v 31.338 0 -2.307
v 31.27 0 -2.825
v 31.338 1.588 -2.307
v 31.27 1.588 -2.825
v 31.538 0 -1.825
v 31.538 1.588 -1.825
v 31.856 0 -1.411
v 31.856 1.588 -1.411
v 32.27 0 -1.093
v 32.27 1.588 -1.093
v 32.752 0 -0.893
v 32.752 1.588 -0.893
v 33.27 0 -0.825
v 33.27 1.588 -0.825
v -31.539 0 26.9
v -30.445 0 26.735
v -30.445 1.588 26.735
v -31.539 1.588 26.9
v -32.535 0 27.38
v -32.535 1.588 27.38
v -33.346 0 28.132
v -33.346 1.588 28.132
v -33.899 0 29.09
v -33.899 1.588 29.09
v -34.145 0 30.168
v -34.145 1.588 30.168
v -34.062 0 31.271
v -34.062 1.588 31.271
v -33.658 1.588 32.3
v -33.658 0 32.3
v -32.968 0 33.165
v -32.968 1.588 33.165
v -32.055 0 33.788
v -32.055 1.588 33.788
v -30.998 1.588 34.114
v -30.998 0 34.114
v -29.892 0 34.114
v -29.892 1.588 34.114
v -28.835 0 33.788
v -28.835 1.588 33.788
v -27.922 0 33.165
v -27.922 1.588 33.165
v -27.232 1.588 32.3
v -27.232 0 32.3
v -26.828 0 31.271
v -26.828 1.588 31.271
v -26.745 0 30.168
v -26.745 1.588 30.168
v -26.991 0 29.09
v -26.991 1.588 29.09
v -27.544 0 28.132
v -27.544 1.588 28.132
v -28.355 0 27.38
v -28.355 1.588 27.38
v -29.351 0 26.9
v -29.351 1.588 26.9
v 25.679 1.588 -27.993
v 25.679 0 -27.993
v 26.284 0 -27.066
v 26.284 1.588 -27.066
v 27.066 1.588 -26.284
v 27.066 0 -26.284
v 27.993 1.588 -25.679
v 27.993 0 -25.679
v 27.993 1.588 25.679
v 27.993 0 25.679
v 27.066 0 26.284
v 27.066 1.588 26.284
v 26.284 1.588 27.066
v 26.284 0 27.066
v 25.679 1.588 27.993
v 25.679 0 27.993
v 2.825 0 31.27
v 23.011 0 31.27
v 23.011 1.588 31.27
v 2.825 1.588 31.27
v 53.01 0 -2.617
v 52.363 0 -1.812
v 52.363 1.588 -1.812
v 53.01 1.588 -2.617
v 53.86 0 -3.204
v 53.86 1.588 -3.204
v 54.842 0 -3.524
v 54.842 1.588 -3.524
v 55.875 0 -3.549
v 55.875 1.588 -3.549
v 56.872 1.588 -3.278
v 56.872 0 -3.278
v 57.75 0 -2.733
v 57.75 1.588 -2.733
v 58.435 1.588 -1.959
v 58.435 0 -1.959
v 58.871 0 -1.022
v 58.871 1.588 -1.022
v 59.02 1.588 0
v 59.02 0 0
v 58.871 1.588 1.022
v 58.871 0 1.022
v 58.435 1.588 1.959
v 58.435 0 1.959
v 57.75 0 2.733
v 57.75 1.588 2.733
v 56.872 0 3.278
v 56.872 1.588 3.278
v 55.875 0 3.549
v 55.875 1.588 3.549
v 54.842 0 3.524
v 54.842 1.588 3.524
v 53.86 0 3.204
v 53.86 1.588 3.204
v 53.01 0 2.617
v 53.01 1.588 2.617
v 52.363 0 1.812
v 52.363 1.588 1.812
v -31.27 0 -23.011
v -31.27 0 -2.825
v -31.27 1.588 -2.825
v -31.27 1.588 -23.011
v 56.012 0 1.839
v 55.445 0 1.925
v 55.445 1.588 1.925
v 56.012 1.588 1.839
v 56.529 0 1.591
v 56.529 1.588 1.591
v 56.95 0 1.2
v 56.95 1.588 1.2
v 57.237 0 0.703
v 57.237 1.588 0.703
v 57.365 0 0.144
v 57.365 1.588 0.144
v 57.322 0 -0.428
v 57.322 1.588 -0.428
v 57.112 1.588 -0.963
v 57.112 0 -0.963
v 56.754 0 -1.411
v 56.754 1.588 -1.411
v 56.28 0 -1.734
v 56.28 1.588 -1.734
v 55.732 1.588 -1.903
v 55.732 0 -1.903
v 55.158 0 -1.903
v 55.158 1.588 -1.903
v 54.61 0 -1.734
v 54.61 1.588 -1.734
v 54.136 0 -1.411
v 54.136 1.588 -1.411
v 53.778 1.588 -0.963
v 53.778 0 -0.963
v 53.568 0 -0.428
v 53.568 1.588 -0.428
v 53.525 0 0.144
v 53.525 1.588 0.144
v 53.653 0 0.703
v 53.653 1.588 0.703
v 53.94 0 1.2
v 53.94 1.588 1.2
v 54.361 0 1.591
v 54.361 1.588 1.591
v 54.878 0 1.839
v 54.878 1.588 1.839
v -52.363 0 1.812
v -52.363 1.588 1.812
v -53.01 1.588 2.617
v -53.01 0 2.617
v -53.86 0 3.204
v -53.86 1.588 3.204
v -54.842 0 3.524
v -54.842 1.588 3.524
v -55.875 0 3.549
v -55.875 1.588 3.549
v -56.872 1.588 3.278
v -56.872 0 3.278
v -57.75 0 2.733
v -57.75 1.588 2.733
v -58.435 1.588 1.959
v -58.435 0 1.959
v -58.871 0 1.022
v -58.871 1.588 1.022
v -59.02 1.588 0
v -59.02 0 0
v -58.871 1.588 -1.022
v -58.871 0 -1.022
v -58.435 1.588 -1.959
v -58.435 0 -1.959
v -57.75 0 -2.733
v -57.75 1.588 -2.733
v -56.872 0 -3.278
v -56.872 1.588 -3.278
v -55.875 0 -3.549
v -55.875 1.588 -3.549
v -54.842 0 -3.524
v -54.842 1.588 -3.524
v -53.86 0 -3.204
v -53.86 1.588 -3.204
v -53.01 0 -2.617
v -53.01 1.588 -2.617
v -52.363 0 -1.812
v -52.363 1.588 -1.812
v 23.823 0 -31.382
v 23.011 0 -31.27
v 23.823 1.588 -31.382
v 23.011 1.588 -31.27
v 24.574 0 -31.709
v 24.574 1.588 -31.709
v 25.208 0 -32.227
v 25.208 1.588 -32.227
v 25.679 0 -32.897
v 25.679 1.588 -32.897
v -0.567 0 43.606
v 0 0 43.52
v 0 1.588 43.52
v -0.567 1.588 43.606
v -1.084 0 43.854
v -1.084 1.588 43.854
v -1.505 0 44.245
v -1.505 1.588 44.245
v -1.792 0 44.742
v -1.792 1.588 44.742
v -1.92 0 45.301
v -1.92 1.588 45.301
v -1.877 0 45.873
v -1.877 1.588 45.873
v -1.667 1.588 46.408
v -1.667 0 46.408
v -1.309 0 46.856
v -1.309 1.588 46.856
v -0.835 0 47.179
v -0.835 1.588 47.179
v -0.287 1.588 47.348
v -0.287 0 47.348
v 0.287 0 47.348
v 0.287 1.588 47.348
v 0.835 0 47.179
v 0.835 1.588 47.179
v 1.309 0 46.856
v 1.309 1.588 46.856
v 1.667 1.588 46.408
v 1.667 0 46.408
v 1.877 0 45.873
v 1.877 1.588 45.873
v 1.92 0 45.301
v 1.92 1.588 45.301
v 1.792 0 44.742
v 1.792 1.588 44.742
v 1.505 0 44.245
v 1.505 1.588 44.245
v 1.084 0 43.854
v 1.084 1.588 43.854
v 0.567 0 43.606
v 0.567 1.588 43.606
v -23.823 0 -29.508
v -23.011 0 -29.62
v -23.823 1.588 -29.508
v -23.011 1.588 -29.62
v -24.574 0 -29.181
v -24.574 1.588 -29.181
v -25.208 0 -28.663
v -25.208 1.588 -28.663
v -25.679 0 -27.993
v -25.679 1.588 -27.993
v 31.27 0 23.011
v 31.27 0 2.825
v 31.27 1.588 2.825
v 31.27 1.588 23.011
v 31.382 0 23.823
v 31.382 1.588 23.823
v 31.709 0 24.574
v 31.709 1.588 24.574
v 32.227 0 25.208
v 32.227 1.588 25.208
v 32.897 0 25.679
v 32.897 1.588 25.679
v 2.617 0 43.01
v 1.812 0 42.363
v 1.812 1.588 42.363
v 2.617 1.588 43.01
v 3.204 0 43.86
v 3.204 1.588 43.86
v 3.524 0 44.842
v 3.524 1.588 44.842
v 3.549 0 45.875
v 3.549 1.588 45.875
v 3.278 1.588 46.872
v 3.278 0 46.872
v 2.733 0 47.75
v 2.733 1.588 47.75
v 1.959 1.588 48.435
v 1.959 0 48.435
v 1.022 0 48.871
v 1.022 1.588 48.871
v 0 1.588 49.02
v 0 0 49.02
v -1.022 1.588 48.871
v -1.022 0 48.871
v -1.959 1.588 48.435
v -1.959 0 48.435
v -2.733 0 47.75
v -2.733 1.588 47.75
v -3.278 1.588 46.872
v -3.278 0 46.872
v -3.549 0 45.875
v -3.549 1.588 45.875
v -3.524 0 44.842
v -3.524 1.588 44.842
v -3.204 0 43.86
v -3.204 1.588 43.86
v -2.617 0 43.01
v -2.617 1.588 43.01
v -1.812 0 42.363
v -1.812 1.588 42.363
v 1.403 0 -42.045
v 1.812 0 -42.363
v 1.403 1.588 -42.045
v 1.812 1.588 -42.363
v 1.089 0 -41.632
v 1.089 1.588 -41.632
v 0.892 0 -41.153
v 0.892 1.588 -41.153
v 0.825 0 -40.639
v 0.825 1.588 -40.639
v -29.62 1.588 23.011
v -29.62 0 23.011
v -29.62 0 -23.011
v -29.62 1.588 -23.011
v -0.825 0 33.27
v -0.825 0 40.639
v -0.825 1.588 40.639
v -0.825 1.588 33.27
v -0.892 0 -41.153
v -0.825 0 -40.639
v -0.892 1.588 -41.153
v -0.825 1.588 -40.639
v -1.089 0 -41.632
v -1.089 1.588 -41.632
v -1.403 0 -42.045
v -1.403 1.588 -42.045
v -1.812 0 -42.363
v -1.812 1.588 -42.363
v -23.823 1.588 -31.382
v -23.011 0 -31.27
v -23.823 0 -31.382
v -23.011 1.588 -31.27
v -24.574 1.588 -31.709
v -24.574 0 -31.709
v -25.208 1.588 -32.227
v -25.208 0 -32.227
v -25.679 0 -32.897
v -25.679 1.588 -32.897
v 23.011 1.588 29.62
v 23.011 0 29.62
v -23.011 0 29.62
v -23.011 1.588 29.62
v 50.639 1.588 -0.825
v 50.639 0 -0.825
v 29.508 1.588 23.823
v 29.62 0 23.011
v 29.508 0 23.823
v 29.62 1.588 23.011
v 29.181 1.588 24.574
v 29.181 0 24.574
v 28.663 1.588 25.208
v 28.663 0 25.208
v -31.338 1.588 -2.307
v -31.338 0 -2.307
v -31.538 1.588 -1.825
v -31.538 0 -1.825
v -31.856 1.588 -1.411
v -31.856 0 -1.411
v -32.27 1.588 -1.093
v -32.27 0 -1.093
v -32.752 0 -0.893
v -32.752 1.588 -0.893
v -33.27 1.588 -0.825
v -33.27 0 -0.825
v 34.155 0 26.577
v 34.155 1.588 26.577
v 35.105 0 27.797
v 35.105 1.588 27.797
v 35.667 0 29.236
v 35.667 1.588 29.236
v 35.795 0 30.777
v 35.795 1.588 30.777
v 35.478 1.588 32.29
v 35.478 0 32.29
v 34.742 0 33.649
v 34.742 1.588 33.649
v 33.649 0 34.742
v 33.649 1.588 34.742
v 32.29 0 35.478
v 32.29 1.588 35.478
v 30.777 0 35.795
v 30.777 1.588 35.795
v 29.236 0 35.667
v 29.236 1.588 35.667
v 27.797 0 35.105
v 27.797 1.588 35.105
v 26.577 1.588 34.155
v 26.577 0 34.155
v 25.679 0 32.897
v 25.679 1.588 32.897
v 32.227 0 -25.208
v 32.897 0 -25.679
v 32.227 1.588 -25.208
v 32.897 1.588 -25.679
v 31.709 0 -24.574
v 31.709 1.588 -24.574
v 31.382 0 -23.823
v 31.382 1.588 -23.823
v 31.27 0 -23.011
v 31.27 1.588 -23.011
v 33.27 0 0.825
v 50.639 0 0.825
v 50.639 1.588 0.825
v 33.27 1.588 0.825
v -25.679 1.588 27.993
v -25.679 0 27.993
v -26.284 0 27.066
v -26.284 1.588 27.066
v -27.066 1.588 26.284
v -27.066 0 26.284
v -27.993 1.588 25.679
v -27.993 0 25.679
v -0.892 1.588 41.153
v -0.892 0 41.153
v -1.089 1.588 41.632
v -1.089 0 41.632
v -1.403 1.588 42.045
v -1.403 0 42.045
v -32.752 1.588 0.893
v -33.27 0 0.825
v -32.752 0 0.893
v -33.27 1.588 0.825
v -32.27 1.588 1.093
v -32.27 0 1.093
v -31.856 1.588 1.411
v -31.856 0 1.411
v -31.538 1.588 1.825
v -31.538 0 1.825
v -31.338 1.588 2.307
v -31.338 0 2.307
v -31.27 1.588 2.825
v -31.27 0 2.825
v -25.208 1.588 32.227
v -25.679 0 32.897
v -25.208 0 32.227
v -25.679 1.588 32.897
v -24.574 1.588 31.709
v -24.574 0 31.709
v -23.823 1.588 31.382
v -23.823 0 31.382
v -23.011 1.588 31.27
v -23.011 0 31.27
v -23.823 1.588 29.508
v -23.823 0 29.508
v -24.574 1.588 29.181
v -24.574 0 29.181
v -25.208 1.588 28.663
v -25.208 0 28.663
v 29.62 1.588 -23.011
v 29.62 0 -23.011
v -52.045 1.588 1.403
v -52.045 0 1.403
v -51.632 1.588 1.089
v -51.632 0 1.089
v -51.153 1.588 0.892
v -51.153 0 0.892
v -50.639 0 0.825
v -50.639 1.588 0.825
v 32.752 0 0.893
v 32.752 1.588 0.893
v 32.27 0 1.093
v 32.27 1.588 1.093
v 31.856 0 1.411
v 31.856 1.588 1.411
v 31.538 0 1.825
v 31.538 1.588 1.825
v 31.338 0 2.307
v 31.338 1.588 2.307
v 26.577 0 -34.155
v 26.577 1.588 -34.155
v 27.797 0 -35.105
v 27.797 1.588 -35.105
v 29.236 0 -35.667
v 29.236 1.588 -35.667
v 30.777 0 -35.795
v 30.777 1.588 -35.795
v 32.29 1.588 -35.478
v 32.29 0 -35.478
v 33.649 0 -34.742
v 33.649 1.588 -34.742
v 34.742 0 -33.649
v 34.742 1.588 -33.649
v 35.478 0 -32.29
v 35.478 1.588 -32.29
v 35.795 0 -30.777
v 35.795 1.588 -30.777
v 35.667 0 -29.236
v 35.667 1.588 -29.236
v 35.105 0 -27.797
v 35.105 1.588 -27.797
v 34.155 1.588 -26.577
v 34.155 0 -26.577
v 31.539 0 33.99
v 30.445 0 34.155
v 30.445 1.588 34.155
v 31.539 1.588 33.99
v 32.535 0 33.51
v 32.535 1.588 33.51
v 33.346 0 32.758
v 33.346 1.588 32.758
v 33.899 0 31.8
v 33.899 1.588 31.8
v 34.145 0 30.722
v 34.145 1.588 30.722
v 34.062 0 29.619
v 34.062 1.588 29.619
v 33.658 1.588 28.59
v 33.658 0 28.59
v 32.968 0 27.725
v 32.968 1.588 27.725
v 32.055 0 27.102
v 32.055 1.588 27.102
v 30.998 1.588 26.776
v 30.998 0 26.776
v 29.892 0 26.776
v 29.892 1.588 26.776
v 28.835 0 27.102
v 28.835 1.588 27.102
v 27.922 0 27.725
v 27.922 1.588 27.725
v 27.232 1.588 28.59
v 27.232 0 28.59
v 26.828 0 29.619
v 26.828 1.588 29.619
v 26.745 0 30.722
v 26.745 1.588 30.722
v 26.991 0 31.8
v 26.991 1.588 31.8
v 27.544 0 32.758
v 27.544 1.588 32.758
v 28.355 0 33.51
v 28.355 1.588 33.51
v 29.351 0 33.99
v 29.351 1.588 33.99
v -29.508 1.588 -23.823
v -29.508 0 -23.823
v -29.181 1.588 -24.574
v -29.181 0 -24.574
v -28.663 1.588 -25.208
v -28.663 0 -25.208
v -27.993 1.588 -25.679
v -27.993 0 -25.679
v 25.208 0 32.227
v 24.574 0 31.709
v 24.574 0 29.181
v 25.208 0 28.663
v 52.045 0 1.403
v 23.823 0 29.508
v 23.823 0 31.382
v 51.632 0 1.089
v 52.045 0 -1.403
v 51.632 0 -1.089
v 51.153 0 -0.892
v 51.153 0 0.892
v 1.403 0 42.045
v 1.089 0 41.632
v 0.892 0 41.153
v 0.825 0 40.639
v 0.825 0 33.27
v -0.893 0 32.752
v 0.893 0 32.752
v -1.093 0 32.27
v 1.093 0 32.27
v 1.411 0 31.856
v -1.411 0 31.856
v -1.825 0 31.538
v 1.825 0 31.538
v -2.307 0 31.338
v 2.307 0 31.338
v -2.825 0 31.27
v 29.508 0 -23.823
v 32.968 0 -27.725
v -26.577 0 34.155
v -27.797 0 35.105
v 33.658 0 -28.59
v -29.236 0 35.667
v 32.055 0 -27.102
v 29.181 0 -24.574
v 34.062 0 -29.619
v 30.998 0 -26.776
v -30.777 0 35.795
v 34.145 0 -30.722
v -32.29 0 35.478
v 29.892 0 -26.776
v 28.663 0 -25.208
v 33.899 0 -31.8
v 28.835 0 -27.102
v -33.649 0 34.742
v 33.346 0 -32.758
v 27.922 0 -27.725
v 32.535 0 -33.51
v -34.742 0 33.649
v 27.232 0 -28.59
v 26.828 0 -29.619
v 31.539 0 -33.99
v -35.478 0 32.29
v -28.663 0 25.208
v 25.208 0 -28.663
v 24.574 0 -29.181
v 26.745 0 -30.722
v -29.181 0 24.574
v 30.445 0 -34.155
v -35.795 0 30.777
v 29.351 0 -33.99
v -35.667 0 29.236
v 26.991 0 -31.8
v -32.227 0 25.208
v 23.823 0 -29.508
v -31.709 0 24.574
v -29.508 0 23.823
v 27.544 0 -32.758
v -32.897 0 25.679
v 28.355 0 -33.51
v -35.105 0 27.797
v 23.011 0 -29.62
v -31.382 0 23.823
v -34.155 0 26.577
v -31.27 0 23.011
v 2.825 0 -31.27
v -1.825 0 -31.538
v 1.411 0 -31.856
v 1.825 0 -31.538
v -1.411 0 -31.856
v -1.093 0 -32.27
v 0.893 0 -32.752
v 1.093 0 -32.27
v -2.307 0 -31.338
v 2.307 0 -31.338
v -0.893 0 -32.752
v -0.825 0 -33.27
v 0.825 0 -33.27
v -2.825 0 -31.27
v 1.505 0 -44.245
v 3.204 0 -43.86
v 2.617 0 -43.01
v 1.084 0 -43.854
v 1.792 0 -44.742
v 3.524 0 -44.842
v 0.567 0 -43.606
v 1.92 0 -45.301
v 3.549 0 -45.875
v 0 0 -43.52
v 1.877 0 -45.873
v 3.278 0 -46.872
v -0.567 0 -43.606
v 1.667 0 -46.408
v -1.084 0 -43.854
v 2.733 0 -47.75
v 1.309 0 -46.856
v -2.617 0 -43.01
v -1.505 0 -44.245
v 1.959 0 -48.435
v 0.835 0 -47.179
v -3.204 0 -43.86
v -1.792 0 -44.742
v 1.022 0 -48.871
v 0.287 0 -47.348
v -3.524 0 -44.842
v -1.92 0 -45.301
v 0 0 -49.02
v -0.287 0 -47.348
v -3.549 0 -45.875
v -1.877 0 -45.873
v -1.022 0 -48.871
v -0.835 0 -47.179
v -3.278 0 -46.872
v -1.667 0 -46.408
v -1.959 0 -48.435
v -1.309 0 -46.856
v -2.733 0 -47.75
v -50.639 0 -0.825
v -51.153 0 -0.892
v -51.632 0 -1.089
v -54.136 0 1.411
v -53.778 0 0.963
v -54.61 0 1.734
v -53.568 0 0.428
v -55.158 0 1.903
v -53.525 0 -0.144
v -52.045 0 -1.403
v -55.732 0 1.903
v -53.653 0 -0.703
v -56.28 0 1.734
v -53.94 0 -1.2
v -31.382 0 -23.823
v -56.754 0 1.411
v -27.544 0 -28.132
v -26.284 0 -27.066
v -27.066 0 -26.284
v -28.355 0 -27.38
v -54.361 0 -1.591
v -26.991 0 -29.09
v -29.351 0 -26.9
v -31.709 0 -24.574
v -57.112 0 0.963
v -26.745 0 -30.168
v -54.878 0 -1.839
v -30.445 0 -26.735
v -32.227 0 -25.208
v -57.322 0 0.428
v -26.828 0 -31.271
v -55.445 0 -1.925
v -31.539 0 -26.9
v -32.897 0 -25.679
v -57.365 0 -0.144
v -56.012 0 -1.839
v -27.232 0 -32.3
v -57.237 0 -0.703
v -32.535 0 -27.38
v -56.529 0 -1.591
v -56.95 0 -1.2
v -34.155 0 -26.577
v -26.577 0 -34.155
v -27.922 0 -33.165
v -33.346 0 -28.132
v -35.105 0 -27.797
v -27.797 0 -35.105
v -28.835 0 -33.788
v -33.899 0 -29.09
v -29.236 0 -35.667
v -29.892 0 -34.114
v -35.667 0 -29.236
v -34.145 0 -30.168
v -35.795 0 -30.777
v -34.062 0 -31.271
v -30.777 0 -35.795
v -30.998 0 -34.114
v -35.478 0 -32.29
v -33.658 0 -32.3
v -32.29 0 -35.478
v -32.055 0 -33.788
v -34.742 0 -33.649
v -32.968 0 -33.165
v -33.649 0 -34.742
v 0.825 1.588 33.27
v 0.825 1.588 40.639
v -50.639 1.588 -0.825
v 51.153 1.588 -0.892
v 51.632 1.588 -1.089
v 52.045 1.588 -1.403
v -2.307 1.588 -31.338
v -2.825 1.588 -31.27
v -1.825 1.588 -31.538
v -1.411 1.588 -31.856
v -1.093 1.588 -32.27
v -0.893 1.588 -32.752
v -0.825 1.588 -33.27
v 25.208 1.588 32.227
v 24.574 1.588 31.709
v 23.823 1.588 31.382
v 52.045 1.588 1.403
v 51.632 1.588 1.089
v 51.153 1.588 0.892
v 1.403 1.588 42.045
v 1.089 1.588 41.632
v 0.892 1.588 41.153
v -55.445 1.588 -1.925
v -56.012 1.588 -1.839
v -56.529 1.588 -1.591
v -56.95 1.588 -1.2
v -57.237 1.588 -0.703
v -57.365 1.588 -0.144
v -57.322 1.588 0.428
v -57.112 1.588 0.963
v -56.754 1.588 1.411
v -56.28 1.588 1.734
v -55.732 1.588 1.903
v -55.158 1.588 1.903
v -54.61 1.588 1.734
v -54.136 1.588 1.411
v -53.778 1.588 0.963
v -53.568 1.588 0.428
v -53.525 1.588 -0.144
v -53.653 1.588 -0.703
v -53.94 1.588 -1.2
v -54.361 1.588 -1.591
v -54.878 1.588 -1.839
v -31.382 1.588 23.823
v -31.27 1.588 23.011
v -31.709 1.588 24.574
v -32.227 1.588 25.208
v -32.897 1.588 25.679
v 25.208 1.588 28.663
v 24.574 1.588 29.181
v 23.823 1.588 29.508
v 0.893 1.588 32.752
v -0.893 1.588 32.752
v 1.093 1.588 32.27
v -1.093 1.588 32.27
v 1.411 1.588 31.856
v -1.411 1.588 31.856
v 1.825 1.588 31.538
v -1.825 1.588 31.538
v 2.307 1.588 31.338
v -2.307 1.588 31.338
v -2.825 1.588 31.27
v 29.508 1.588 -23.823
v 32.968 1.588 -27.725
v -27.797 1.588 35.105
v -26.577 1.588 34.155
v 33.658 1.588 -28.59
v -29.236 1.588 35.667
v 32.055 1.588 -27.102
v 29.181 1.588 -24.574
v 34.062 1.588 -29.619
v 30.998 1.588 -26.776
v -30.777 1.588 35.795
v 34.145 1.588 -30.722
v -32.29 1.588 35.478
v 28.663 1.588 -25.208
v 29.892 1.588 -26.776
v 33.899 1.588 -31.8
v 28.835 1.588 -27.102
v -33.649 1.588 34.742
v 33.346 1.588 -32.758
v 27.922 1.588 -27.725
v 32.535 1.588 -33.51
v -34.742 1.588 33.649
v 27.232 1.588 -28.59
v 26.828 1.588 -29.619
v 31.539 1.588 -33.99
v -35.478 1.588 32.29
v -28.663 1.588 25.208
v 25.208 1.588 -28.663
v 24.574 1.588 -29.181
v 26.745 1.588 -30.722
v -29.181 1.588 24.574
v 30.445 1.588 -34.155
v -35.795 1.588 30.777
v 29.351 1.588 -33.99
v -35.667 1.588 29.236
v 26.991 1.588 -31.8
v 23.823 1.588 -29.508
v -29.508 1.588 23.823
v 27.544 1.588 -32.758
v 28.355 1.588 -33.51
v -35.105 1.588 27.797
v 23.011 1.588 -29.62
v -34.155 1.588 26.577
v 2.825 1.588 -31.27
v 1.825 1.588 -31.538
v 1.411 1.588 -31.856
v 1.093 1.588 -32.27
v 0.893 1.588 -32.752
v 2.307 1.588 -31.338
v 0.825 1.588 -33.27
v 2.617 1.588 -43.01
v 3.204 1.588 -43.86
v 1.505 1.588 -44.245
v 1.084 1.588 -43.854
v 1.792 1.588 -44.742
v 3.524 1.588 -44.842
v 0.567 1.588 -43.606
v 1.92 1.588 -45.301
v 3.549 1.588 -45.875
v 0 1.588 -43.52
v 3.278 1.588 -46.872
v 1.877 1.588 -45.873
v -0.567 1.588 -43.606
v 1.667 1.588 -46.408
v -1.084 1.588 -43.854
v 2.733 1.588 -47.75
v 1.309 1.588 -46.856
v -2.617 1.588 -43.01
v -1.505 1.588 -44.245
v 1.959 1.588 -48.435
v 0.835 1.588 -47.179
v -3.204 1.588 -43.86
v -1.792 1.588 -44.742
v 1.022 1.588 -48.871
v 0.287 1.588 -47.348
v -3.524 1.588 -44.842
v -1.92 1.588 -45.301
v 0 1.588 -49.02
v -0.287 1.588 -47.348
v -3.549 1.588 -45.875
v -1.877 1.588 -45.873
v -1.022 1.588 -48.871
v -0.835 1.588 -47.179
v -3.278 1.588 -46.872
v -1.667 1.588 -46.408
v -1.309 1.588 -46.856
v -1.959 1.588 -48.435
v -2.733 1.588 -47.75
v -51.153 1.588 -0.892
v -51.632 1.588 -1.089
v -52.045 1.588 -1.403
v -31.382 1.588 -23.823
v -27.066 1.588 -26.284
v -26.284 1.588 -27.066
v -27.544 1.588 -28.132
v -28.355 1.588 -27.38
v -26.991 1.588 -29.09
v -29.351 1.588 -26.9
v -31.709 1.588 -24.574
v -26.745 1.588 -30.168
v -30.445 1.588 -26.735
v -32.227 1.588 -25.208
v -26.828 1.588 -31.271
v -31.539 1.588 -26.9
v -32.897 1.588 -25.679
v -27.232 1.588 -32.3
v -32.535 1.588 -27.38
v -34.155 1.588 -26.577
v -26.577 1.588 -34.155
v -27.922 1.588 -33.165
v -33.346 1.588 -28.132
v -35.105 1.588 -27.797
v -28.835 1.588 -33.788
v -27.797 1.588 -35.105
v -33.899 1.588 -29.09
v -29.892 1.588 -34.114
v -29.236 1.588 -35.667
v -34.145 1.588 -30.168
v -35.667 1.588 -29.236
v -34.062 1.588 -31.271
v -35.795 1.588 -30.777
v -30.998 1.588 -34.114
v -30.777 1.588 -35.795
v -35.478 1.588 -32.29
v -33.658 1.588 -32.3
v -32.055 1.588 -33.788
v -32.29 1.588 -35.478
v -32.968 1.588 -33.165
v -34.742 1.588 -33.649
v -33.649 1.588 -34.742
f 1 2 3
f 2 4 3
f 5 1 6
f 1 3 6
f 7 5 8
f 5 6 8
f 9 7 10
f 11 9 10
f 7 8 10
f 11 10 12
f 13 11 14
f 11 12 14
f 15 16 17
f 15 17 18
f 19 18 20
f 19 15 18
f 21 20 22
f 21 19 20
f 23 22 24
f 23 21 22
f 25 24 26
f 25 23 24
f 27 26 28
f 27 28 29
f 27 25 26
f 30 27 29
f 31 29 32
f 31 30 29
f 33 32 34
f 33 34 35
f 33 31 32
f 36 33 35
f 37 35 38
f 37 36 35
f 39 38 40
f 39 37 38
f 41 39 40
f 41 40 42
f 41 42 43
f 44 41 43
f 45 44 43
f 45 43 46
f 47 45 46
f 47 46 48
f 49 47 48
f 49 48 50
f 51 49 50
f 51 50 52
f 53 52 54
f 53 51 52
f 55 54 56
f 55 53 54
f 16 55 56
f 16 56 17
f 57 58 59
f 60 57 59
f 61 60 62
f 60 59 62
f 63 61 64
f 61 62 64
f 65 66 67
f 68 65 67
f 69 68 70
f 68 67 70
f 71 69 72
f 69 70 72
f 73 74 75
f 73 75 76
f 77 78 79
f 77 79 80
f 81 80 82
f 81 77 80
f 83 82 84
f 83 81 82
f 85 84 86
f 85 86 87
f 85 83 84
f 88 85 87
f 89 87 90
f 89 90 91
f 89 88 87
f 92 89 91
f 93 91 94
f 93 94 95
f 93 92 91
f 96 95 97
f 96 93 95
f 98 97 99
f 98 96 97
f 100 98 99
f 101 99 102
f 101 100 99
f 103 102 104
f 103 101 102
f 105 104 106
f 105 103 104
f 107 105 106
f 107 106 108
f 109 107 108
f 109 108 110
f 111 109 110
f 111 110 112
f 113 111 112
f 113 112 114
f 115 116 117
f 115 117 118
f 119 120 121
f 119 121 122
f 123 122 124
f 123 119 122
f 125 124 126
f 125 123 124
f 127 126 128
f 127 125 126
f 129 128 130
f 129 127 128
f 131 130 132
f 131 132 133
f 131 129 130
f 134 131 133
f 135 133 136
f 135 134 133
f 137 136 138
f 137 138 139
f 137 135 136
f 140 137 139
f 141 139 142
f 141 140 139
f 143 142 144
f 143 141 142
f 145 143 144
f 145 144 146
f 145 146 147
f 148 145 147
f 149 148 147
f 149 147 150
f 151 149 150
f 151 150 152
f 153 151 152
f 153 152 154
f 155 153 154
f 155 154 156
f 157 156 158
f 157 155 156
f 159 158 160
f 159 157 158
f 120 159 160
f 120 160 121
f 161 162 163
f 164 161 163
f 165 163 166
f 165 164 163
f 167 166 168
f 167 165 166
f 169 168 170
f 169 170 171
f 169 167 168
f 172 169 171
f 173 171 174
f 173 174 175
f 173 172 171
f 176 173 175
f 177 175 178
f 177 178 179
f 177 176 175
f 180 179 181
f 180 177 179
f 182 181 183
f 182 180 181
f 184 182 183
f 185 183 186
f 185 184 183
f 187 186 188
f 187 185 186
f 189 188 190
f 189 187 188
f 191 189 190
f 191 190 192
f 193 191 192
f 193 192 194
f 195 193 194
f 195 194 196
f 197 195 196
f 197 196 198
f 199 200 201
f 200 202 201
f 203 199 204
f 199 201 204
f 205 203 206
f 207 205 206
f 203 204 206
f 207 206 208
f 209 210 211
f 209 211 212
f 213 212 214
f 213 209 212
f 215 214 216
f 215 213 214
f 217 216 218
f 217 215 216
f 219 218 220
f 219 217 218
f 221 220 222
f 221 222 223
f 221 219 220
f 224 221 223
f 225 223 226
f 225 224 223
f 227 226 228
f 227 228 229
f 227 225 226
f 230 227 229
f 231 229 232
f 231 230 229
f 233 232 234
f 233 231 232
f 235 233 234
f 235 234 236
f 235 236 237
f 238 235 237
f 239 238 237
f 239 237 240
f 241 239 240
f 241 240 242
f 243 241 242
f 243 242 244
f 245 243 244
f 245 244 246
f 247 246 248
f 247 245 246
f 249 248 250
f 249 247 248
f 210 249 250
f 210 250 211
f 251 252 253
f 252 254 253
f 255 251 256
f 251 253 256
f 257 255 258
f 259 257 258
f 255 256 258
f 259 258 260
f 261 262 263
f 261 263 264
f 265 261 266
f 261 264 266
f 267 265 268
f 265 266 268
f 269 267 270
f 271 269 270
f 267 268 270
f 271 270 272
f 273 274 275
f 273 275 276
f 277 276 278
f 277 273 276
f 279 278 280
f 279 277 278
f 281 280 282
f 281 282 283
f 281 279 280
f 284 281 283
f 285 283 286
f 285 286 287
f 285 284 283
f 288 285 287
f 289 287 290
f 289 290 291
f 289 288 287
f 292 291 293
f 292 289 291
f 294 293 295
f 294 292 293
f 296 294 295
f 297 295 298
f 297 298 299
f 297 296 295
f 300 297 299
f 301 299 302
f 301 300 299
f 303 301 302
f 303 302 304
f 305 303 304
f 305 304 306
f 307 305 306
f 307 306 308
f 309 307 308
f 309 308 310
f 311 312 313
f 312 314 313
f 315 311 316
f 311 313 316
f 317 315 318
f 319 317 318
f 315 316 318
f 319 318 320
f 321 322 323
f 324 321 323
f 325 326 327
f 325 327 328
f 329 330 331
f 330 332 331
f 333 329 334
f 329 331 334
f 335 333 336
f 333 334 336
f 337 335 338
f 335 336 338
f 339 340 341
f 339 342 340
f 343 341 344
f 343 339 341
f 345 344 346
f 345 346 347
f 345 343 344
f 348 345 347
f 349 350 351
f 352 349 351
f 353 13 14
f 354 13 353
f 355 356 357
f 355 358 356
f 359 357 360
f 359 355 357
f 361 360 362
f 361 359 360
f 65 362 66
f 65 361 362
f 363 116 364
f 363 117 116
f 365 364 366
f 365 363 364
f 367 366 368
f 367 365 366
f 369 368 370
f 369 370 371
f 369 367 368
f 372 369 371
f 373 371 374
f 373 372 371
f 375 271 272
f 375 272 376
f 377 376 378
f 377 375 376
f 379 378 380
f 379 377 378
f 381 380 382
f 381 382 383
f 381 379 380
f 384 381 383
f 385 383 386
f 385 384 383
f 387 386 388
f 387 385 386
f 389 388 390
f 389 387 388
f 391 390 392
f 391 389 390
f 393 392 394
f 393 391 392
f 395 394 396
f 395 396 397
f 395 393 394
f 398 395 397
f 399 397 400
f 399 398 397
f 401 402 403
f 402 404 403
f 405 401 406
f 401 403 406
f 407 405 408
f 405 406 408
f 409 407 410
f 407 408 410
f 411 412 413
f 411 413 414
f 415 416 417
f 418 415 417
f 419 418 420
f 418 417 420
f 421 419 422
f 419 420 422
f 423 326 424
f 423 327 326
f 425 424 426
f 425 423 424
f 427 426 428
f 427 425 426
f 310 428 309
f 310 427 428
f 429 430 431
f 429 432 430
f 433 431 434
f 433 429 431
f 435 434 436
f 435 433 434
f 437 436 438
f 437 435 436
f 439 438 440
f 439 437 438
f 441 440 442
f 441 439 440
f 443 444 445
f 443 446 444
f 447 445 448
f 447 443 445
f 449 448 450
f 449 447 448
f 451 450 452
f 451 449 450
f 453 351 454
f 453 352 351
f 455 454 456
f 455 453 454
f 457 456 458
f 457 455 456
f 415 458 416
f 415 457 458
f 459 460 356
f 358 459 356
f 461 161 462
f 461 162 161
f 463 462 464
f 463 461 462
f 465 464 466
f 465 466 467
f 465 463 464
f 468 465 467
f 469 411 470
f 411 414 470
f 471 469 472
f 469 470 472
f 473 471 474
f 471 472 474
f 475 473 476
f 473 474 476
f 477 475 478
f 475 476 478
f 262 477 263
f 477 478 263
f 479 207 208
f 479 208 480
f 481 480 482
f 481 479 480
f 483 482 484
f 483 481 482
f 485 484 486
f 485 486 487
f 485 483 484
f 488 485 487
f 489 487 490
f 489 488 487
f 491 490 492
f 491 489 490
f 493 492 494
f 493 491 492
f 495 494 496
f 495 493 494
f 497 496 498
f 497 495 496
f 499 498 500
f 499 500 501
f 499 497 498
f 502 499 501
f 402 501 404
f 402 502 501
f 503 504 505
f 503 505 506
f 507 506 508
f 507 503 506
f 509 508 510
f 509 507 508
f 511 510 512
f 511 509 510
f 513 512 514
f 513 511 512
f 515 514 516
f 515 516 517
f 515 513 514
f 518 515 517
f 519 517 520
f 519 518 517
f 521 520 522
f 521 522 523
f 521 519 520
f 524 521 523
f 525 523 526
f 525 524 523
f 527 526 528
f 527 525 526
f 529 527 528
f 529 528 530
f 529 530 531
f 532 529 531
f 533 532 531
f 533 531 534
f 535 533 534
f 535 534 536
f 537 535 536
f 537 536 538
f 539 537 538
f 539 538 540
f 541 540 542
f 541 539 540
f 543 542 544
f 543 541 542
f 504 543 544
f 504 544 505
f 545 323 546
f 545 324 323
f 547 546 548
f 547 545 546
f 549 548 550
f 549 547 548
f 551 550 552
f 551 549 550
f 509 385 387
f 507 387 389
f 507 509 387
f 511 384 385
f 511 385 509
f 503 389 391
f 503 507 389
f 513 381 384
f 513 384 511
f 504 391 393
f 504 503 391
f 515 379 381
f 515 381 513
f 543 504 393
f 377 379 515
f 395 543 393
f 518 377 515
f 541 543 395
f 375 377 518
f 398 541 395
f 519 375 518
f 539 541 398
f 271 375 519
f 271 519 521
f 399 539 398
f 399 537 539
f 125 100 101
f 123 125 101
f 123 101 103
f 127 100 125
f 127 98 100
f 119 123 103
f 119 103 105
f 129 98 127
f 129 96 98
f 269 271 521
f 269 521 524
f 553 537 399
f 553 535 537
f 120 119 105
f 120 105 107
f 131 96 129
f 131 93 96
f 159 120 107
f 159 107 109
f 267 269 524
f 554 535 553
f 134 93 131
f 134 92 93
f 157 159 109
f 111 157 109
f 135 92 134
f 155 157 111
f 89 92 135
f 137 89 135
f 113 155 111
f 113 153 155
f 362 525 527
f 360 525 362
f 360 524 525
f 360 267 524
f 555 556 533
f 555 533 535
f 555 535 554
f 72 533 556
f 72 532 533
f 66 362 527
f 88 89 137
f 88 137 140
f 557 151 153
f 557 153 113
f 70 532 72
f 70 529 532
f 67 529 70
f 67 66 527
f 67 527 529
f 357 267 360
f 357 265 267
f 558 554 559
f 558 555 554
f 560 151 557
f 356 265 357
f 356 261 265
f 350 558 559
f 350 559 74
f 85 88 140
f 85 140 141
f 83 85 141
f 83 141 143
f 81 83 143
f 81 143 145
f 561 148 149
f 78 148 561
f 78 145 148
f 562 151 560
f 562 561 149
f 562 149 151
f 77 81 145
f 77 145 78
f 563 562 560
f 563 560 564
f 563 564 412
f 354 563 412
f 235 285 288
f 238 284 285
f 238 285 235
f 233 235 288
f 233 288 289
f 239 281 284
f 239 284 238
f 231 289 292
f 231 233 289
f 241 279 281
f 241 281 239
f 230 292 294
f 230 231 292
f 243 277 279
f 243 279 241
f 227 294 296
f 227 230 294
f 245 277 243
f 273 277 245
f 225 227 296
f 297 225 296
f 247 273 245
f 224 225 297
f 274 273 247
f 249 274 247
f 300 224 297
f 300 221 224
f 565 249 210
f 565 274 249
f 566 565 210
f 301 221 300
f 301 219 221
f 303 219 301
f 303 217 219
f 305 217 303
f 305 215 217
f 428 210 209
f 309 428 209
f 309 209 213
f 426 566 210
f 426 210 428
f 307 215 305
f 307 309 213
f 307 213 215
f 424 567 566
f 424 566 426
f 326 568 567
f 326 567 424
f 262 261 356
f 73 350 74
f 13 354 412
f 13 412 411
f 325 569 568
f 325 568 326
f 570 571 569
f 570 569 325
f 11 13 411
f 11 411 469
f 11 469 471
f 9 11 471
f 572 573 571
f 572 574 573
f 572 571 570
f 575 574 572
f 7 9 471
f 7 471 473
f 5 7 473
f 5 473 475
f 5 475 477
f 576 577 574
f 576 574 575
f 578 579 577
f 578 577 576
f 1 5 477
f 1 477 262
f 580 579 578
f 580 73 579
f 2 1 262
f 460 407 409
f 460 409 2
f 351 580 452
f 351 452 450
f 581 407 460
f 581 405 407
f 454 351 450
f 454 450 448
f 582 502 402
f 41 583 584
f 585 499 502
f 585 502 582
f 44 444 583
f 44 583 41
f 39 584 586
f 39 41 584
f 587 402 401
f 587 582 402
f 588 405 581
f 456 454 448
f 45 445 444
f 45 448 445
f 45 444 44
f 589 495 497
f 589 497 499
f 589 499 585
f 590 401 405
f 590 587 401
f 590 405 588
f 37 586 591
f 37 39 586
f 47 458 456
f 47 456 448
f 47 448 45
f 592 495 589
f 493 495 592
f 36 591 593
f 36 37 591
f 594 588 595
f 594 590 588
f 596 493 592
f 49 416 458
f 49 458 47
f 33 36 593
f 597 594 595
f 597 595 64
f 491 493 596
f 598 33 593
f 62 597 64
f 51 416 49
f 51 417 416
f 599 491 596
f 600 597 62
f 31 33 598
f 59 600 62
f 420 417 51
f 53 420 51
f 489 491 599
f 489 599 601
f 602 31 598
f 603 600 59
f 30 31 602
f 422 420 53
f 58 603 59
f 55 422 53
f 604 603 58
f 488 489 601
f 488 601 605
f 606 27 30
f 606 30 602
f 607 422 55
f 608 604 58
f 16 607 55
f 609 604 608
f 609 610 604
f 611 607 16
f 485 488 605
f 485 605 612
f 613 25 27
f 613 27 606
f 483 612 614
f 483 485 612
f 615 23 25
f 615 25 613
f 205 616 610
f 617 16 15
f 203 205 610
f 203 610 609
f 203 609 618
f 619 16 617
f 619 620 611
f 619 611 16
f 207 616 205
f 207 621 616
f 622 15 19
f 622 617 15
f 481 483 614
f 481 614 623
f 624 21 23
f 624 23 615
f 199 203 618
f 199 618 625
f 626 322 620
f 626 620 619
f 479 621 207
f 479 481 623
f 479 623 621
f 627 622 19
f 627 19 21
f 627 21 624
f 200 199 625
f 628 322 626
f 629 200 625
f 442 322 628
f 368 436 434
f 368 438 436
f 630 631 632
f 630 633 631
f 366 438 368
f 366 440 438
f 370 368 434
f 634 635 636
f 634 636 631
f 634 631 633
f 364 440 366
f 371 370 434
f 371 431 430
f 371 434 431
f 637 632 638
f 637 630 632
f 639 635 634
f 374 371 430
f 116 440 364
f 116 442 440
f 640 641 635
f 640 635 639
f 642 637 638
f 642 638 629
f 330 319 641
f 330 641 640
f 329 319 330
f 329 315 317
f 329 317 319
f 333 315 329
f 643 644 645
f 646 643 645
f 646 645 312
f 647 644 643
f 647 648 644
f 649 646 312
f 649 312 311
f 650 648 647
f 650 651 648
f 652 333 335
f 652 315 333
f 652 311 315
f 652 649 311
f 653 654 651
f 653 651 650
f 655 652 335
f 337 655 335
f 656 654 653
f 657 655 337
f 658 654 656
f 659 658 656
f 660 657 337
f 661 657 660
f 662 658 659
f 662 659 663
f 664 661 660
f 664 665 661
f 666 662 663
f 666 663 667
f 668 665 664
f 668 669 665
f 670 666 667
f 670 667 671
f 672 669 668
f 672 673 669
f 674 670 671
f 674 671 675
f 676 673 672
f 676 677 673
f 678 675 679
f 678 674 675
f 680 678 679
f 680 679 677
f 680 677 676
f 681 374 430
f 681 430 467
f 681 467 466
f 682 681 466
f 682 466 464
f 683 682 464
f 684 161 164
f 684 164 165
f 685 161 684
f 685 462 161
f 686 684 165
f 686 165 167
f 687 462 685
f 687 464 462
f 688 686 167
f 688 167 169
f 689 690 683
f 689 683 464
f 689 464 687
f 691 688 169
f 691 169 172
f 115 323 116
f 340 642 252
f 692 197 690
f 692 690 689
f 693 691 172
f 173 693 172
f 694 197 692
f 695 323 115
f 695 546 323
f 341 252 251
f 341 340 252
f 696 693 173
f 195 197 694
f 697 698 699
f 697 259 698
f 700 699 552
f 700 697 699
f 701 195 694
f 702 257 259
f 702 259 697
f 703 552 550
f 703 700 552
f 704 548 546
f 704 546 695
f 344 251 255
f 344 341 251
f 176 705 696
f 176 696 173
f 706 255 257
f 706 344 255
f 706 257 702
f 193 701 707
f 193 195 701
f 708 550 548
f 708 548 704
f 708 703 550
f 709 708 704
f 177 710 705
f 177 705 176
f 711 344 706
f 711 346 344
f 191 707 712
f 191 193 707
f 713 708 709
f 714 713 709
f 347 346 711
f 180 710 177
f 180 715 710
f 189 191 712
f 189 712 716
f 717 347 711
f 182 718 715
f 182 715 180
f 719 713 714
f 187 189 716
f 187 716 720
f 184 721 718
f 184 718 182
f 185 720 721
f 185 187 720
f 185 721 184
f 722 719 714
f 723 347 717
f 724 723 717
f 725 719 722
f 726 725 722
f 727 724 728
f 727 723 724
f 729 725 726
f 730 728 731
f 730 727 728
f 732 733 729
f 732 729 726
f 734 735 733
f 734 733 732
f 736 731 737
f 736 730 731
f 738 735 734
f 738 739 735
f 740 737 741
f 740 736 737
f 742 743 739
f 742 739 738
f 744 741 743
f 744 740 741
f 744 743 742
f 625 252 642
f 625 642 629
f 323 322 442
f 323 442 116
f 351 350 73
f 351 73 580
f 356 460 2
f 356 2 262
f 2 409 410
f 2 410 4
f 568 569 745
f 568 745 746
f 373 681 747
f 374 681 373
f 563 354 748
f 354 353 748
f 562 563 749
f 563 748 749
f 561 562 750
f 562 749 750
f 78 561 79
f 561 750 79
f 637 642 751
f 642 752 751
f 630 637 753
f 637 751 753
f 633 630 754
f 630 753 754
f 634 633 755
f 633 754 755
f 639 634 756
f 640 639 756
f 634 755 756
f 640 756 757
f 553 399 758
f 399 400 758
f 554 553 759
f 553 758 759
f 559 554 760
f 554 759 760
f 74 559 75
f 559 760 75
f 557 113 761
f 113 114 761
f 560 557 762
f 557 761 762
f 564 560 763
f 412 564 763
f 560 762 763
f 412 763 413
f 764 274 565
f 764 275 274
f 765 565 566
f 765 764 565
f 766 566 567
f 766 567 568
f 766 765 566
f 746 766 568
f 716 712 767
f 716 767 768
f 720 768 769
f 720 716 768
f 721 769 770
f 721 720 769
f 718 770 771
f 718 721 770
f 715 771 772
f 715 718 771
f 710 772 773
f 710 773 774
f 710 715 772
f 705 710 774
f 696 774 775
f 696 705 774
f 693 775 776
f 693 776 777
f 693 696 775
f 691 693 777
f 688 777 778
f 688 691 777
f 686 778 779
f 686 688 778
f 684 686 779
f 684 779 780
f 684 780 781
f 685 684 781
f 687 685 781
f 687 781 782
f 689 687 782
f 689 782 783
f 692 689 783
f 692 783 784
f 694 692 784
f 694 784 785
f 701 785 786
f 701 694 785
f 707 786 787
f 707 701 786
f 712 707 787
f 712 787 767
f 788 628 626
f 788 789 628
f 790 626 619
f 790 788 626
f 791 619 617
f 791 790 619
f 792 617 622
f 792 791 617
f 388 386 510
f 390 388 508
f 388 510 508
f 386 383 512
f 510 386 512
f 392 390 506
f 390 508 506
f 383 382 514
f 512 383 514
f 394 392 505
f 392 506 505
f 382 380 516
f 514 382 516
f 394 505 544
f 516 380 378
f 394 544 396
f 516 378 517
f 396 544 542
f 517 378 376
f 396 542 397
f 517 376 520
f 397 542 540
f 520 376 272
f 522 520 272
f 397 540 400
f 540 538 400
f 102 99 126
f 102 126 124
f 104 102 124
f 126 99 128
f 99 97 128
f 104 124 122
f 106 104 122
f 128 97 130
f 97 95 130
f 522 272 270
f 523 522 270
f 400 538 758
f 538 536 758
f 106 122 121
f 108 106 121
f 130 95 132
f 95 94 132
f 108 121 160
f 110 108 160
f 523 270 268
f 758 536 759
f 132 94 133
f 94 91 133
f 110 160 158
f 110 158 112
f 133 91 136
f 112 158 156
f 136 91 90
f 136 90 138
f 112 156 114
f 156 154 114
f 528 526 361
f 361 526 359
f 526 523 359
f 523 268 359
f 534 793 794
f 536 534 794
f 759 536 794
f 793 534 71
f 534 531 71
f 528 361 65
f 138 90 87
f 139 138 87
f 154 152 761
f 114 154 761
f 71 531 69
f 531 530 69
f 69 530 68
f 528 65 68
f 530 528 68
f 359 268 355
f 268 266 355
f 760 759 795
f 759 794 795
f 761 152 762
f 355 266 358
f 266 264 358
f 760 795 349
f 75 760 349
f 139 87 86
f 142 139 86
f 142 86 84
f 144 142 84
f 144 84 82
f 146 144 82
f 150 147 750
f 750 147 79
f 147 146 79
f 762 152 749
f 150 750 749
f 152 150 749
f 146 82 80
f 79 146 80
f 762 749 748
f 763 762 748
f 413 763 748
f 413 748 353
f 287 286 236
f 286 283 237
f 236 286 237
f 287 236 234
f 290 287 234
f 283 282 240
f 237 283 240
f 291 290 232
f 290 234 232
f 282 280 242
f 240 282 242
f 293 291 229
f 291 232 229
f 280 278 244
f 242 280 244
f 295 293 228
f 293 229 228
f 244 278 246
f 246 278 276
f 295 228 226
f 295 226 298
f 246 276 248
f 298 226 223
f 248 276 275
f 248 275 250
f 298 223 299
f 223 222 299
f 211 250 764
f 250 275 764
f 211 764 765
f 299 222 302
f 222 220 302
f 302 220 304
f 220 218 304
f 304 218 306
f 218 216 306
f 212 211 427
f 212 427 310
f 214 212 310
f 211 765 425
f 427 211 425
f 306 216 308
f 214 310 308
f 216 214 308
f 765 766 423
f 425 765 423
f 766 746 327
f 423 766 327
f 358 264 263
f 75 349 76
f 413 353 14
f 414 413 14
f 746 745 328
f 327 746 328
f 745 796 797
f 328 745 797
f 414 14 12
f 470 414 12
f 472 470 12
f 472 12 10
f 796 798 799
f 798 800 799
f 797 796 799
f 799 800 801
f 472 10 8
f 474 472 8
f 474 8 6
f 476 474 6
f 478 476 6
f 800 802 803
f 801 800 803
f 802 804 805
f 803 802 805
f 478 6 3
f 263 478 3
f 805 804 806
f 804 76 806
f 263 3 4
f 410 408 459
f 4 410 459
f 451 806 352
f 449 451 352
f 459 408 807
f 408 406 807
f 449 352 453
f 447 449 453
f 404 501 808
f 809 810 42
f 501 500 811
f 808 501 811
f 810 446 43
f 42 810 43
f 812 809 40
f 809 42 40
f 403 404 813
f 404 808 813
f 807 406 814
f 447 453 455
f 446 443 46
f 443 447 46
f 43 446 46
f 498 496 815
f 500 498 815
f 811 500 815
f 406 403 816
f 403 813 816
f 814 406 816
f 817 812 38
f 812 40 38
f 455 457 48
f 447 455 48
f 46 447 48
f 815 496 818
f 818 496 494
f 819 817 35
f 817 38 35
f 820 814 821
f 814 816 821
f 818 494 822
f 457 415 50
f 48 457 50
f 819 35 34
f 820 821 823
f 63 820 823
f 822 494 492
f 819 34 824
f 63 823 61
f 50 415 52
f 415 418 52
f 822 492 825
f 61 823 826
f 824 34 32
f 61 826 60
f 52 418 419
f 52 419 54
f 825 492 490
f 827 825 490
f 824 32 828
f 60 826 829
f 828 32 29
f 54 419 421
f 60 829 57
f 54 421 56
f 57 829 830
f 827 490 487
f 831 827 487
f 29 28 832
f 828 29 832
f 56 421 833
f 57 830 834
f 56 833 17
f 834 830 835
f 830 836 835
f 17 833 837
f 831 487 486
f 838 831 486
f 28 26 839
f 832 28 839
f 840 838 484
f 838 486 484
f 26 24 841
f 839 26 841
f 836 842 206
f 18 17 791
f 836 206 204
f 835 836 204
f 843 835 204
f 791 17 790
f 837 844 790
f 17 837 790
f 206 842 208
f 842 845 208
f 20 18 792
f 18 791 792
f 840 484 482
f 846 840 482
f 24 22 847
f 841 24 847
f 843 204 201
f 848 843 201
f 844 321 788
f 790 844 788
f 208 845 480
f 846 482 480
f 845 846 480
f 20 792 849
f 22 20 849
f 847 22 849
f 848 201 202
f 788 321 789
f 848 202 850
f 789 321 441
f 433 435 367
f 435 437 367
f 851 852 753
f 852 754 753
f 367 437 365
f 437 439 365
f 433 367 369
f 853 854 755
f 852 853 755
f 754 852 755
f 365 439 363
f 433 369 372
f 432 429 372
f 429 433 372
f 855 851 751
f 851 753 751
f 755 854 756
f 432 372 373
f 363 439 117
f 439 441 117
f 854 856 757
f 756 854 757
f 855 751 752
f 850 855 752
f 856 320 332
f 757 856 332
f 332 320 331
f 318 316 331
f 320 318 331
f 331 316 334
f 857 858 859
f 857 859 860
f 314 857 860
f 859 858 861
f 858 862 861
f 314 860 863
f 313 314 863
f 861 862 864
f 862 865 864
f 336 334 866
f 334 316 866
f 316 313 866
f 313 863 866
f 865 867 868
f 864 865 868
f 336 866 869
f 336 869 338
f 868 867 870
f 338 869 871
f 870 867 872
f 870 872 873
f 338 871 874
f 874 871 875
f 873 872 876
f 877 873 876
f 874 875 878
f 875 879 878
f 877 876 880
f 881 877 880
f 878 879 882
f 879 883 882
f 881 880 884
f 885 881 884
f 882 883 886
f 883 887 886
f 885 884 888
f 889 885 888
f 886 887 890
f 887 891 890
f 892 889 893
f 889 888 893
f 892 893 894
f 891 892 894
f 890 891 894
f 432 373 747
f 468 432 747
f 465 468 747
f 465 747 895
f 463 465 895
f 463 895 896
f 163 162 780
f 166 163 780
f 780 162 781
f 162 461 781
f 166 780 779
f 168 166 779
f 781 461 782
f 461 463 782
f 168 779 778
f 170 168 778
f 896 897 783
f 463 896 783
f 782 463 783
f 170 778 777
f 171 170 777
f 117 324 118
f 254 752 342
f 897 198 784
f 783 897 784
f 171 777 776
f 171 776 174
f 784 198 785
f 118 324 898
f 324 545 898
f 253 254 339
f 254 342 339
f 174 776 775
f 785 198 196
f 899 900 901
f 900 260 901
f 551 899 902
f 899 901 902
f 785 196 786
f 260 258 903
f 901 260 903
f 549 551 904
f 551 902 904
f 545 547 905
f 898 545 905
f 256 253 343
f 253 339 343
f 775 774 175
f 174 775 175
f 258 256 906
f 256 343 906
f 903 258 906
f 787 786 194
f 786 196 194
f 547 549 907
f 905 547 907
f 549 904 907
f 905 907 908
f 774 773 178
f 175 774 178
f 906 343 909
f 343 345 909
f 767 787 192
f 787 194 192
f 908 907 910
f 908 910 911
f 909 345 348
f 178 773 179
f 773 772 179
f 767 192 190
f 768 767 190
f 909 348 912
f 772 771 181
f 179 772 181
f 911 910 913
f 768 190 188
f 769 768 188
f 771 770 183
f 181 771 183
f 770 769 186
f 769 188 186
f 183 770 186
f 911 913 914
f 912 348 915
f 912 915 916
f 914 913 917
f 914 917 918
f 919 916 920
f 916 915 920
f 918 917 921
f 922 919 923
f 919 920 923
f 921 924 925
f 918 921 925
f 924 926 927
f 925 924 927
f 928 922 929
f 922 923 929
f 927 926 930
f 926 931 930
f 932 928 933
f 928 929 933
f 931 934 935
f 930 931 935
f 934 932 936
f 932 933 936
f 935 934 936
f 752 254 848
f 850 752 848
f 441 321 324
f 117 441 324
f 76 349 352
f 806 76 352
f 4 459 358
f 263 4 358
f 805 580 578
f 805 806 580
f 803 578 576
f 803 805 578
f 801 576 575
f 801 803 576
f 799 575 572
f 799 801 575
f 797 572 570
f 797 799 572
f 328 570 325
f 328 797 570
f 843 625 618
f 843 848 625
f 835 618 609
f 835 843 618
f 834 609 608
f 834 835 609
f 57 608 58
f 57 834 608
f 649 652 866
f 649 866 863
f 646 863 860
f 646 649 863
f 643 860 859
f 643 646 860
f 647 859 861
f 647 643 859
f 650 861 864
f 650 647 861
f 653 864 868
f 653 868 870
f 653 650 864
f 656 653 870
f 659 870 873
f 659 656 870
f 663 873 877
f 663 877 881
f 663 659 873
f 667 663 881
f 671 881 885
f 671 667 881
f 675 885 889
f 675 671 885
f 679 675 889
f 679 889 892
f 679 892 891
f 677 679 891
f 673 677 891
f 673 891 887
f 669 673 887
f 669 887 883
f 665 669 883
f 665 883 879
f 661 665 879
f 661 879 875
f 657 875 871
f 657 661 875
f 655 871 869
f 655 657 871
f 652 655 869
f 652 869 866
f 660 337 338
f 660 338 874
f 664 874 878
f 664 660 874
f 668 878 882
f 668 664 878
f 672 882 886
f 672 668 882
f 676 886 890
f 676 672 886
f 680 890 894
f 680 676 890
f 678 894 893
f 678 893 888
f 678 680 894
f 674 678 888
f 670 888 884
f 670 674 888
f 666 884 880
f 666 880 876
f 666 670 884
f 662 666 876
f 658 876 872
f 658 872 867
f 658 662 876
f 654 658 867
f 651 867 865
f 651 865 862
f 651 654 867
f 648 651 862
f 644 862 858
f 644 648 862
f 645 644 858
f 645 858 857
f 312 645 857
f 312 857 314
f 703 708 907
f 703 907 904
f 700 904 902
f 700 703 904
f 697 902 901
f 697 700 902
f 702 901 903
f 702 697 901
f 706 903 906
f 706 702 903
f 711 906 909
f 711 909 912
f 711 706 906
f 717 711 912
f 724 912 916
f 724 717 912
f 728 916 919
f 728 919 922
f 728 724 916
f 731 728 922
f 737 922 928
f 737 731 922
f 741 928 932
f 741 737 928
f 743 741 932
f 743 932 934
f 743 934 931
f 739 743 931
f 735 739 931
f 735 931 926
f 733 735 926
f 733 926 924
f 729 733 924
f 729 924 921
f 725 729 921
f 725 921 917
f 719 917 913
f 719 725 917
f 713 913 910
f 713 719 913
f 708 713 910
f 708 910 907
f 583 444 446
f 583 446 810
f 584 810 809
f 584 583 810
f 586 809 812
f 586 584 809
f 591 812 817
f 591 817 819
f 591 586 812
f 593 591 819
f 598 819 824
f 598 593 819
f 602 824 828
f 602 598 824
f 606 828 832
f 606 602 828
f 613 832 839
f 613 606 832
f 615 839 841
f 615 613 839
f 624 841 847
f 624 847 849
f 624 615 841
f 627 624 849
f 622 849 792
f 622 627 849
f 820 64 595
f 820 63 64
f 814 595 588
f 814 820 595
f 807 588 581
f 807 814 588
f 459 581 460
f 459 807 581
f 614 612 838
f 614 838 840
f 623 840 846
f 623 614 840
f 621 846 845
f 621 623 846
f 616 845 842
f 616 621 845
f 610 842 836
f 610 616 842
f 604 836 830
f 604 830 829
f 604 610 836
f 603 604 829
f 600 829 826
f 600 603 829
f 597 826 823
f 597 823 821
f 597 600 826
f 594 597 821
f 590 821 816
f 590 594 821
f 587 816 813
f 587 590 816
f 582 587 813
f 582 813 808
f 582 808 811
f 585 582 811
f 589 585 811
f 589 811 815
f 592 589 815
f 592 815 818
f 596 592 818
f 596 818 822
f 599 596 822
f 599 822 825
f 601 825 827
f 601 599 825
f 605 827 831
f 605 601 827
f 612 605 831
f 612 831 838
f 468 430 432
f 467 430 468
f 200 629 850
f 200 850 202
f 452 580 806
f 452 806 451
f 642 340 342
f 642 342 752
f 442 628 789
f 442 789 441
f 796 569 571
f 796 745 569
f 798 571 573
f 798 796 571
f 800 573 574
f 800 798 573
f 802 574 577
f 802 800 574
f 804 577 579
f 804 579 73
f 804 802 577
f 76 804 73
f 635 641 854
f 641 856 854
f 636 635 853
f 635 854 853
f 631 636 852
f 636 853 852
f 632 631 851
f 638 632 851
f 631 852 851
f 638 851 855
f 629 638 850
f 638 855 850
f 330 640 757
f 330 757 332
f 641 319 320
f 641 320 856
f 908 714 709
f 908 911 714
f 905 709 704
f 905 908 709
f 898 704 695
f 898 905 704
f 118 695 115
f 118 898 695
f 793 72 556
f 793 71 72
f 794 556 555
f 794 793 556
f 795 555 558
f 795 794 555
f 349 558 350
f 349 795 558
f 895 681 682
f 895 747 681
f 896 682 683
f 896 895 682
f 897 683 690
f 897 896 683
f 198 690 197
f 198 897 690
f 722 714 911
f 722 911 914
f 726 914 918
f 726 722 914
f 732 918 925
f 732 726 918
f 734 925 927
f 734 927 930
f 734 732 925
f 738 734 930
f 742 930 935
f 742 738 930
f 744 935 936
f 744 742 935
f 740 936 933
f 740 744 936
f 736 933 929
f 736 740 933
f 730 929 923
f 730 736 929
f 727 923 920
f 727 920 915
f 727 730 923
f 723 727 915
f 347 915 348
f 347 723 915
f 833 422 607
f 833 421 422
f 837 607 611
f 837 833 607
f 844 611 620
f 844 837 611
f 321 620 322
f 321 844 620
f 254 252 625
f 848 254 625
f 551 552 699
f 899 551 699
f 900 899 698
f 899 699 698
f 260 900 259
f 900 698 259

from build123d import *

# Parameters (mm, degrees)
SKETCH1_R           = 3.71
SKETCH1_R_2         = 1.925
BOSS_EXTRUDE1_DEPTH = 1.5875
FILLET1_R           = 3
FILLET2_R           = 2
FILLET3_R           = 2


with BuildPart() as part:
    # Sketch1 → Boss-Extrude1 (new body)
    with BuildSketch(Plane(origin=(0, 0, 0), x_dir=(1, 0, 0), z_dir=(0, 1, 0))):
        with BuildLine():
            Line((-25.148871697, 31.27), (-0.825, 31.27))
            Line((-0.825, 31.27), (-0.825, 41.966494574))
            ThreePointArc((-0.825, 41.966494574), (0, 49.02), (0.825, 41.966494574))
            Line((0.825, 41.966494574), (0.825, 31.27))
            Line((0.825, 31.27), (25.148871697, 31.27))
            ThreePointArc((25.148871697, 31.27), (34.235092347, 34.235092347), (31.27, 25.148871697))
            Line((31.27, 25.148871697), (31.27, 0.825))
            Line((31.27, 0.825), (51.966494574, 0.825))
            ThreePointArc((51.966494574, 0.825), (59.02, 0), (51.966494574, -0.825))
            Line((51.966494574, -0.825), (31.27, -0.825))
            Line((31.27, -0.825), (31.27, -25.148871697))
            ThreePointArc((31.27, -25.148871697), (34.235092347, -34.235092347), (25.148871697, -31.27))
            Line((25.148871697, -31.27), (0.825, -31.27))
            Line((0.825, -31.27), (0.825, -41.966494574))
            ThreePointArc((0.825, -41.966494574), (0, -49.02), (-0.825, -41.966494574))
            Line((-0.825, -41.966494574), (-0.825, -31.27))
            Line((-0.825, -31.27), (-25.148871697, -31.27))
            ThreePointArc((-25.148871697, -31.27), (-34.235092347, -34.235092347), (-31.27, -25.148871697))
            Line((-31.27, -25.148871697), (-31.27, -0.825))
            Line((-31.27, -0.825), (-51.966494574, -0.825))
            ThreePointArc((-51.966494574, -0.825), (-59.02, 0), (-51.966494574, 0.825))
            Line((-51.966494574, 0.825), (-31.27, 0.825))
            Line((-31.27, 0.825), (-31.27, 25.148871697))
            ThreePointArc((-31.27, 25.148871697), (-34.235092347, 34.235092347), (-25.148871697, 31.27))
        make_face()
        with Locations(Location((-30.445, 30.445, 0), (0, 0, 270))):
            Circle(SKETCH1_R, mode=Mode.SUBTRACT)
        with Locations(Location((30.445, 30.445, 0), (0, 0, 90))):
            Circle(SKETCH1_R, mode=Mode.SUBTRACT)
        with Locations(Location((30.445, -30.445, 0), (0, 0, 270))):
            Circle(SKETCH1_R, mode=Mode.SUBTRACT)
        with Locations(Location((-30.445, -30.445, 0), (0, 0, 90))):
            Circle(SKETCH1_R, mode=Mode.SUBTRACT)
        with Locations(Location((0, 45.445, 0), (0, 0, 270))):
            Circle(SKETCH1_R_2, mode=Mode.SUBTRACT)
        with Locations(Location((55.445, 0, 0), (0, 0, 270))):
            Circle(SKETCH1_R_2, mode=Mode.SUBTRACT)
        with Locations(Location((0, -45.445, 0), (0, 0, 90))):
            Circle(SKETCH1_R_2, mode=Mode.SUBTRACT)
        with Locations(Location((-55.445, 0, 0), (0, 0, 90))):
            Circle(SKETCH1_R_2, mode=Mode.SUBTRACT)
        with BuildLine():
            Line((-25.148871697, 29.62), (25.148871697, 29.62))
            ThreePointArc((25.148871697, 29.62), (26.654907653, 26.654907653), (29.62, 25.148871697))
            Line((29.62, 25.148871697), (29.62, -25.148871697))
            ThreePointArc((29.62, -25.148871697), (26.654907653, -26.654907653), (25.148871697, -29.62))
            Line((25.148871697, -29.62), (-25.148871697, -29.62))
            ThreePointArc((-25.148871697, -29.62), (-26.654907653, -26.654907653), (-29.62, -25.148871697))
            Line((-29.62, -25.148871697), (-29.62, 25.148871697))
            ThreePointArc((-29.62, 25.148871697), (-26.654907653, 26.654907653), (-25.148871697, 29.62))
        make_face(mode=Mode.SUBTRACT)
    extrude(amount=BOSS_EXTRUDE1_DEPTH)

    # Fillet1
    fillet1_edges = [part.edges().sort_by_distance(p)[0] for p in [
        (25.148871697, 0.79375, -31.27),
        (31.27, 0.79375, -25.148871697),
        (31.27, 0.79375, 25.148871697),
        (25.148871697, 0.79375, 31.27),
        (-25.148871697, 0.79375, 31.27),
        (-31.27, 0.79375, 25.148871697),
        (-31.27, 0.79375, -25.148871697),
        (-25.148871697, 0.79375, -31.27),
        (-25.148871697, 0.79375, -29.62),
        (-29.62, 0.79375, -25.148871697),
        (-29.62, 0.79375, 25.148871697),
        (-25.148871697, 0.79375, 29.62),
        (25.148871697, 0.79375, 29.62),
        (29.62, 0.79375, 25.148871697),
        (29.62, 0.79375, -25.148871697),
        (25.148871697, 0.79375, -29.62),
    ]]
    fillet(fillet1_edges, radius=FILLET1_R)

    # Fillet2
    fillet2_edges = [part.edges().sort_by_distance(p)[0] for p in [
        (0.825, 0.79375, -31.27),
        (31.27, 0.79375, -0.825),
        (31.27, 0.79375, 0.825),
        (0.825, 0.79375, 31.27),
        (-0.825, 0.79375, 31.27),
        (-31.27, 0.79375, 0.825),
        (-31.27, 0.79375, -0.825),
        (-0.825, 0.79375, -31.27),
    ]]
    fillet(fillet2_edges, radius=FILLET2_R)

    # Fillet3
    fillet3_edges = [part.edges().sort_by_distance(p)[0] for p in [
        (0.825, 0.79375, -41.966494574),
        (51.966494574, 0.79375, -0.825),
        (51.966494574, 0.79375, 0.825),
        (0.825, 0.79375, 41.966494574),
        (-0.825, 0.79375, 41.966494574),
        (-51.966494574, 0.79375, 0.825),
        (-51.966494574, 0.79375, -0.825),
        (-0.825, 0.79375, -41.966494574),
    ]]
    fillet(fillet3_edges, radius=FILLET3_R)


solid = part.part
